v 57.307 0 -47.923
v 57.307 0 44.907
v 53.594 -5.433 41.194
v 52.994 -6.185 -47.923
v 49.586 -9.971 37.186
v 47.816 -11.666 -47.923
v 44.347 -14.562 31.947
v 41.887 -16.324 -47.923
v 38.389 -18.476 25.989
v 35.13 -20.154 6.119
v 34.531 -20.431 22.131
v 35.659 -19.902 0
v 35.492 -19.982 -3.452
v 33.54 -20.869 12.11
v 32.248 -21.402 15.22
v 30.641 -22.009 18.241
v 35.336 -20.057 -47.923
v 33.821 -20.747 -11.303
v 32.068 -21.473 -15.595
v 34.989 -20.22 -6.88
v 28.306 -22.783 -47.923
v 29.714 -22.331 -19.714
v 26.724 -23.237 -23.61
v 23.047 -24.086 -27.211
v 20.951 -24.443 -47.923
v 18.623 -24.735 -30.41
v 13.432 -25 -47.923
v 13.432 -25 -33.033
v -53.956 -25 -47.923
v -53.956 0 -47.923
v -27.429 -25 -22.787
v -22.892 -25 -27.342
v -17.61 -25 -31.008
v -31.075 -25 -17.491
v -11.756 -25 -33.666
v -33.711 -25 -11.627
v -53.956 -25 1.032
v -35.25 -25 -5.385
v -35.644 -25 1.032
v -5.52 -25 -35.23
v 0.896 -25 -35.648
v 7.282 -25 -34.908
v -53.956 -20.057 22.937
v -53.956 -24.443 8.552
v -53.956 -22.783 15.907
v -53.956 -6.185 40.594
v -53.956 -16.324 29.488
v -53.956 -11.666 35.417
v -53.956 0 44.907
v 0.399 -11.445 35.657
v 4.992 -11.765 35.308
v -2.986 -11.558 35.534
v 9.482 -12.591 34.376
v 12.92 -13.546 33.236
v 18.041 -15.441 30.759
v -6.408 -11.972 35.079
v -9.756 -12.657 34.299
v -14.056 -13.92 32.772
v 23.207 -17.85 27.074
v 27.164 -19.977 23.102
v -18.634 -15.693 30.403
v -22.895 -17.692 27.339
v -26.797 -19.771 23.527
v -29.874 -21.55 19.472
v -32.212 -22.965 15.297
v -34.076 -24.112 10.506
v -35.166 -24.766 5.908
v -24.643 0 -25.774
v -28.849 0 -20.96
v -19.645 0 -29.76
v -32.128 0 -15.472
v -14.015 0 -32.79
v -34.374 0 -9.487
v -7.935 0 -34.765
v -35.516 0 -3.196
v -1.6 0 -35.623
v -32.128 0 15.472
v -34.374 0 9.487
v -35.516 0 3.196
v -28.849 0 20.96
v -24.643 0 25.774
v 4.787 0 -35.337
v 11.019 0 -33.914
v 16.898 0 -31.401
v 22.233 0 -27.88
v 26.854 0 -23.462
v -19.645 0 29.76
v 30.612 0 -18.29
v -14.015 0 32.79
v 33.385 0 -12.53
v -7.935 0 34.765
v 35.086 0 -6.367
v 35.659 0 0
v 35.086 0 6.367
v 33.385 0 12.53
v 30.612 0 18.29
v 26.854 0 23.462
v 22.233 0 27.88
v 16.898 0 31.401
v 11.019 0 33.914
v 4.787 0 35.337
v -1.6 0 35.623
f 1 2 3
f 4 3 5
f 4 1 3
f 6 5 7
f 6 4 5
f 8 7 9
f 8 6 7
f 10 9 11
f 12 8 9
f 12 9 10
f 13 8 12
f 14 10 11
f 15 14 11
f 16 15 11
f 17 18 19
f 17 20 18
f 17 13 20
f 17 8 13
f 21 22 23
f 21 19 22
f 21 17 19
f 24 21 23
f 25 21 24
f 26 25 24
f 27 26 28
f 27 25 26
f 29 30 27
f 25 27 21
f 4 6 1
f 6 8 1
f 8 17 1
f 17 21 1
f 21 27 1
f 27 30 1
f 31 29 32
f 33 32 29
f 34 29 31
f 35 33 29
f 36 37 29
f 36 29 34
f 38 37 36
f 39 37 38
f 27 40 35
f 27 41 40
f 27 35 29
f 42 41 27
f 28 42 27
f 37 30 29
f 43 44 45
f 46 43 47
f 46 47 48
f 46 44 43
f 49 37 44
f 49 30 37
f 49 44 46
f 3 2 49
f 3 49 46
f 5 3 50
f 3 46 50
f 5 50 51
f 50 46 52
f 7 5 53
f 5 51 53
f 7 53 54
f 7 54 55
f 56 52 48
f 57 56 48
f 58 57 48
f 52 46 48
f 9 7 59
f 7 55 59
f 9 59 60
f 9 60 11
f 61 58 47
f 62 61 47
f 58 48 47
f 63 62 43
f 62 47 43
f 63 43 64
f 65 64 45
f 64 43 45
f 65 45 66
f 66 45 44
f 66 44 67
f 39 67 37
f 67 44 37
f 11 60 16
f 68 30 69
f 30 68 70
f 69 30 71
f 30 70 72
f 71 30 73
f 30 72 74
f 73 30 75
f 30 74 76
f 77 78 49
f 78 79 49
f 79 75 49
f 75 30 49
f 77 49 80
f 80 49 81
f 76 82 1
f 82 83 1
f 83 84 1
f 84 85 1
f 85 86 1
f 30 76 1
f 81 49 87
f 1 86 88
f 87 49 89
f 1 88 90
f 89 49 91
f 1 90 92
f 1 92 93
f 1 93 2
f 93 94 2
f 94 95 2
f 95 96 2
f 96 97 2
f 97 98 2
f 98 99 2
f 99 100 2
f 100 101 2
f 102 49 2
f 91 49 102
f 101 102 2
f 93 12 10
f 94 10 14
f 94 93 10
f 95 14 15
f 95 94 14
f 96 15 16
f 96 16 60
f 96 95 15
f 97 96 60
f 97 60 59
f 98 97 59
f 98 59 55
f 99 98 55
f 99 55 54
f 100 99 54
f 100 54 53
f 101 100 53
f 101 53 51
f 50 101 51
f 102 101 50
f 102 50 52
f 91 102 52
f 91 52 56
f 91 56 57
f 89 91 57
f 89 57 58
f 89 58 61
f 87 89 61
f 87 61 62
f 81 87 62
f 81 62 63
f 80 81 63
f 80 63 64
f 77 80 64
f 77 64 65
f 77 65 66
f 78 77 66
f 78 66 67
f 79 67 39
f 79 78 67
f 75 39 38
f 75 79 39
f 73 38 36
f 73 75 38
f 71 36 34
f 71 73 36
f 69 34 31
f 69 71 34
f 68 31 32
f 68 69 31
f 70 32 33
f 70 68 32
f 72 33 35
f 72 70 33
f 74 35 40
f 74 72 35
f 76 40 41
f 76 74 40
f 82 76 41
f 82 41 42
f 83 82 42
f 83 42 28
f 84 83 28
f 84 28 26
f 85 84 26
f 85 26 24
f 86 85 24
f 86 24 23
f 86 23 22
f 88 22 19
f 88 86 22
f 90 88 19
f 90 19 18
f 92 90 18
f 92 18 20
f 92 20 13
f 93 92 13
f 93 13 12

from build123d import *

# Parameters (mm, degrees)
F0_W        = 111.2626455724
F0_H        = 92.8305797279
F0_R        = 35.6593077027
F1_DEPTH    = 25
F2_T1_DEPTH = 312.2046894127
F2_T3_DEPTH = 330.6367552572


# Not quite as in the source:
# - a fillet or chamfer that OpenCascade refuses, or shapes differently, is made with other operations: its cross-section is extruded or revolved along the edge and cut away or added


with BuildPart() as f1:
    # F0 (on Front) → F1 (new body)
    with BuildSketch(Plane.XZ):
        with Locations((1.6756337136, -1.5080738813)):
            Rectangle(F0_W, F0_H)
        Circle(F0_R, mode=Mode.SUBTRACT)
    extrude(amount=F1_DEPTH)

    # F2: fillet of radius 51 on 2 edges, made by hand

    # F2_s2 → F2_t1 (cut)
    with BuildSketch(Plane.XY.offset(-157.6104185876)):
        with BuildLine():
            ThreePointArc((57.3069564998, 0), (38.6808969088, -18.3113980822), (13.4321345628, -25))
            Line((13.4321345628, -25), (57.3069564998, -25))
            Line((57.3069564998, -25), (57.3069564998, 0))
        make_face()
    extrude(amount=F2_T1_DEPTH, mode=Mode.SUBTRACT)

    # F2_s4 → F2_t3 (cut)
    with BuildSketch(Plane.YZ.offset(-163.642743915)):
        with BuildLine():
            ThreePointArc((0, 44.9072159827), (-18.3113980822, 26.2811563916), (-25, 1.0323940457))
            Line((-25, 1.0323940457), (-25, 44.9072159827))
            Line((-25, 44.9072159827), (0, 44.9072159827))
        make_face()
    extrude(amount=F2_T3_DEPTH, mode=Mode.SUBTRACT)


solid = f1.part
